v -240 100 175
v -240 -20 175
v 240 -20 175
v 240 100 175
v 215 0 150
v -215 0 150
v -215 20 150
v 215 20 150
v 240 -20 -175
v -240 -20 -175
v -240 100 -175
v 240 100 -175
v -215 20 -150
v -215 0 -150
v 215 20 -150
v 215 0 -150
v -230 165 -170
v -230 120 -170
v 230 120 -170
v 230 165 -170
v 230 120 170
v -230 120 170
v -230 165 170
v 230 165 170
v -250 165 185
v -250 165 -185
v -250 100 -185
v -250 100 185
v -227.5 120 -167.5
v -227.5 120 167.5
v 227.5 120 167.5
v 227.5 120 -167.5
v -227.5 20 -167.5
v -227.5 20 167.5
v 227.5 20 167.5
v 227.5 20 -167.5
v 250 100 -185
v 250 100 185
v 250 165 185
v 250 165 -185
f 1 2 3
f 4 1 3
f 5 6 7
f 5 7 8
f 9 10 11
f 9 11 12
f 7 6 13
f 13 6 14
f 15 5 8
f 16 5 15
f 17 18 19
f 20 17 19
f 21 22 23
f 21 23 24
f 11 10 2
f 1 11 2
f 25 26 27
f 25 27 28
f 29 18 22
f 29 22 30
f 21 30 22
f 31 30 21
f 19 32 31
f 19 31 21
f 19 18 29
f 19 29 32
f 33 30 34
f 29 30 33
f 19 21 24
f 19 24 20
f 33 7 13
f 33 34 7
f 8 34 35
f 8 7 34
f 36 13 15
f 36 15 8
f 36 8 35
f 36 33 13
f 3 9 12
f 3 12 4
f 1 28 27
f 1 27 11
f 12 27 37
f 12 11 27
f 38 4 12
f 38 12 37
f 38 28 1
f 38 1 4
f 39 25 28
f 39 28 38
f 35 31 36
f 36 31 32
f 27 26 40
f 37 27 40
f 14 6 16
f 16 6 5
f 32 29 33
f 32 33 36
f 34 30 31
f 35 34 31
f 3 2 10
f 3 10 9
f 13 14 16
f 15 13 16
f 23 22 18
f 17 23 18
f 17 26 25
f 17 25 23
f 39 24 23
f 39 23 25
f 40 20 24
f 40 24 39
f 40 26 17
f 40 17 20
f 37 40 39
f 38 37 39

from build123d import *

# Parameters (mm, degrees)
SKETCH2_W           = 500
SKETCH2_H           = 370
SKETCH2_W_2         = 430
SKETCH2_H_2         = 300
BOSS_EXTRUDE1_DEPTH = 120
SKETCH4_W           = 500
SKETCH4_H           = 370
SKETCH4_W_2         = 460
SKETCH4_H_2         = 340
BOSS_EXTRUDE2_DEPTH = 45
SKETCH5_W           = 500
SKETCH5_H           = 370
BOSS_EXTRUDE3_DEPTH = 20
SKETCH6_W           = 500
SKETCH6_H           = 370
SKETCH6_W_2         = 480
SKETCH6_H_2         = 350
CUT_EXTRUDE1_DEPTH  = 120
SKETCH8_W           = 455
SKETCH8_H           = 335
CUT_EXTRUDE2_DEPTH  = 100


with BuildPart() as part:
    # Sketch2 → Boss-Extrude1 (new body)
    with BuildSketch(Plane(origin=(0, 0, 0), x_dir=(1, 0, 0), z_dir=(0, 1, 0))):
        Rectangle(SKETCH2_W, SKETCH2_H)
        Rectangle(SKETCH2_W_2, SKETCH2_H_2, mode=Mode.SUBTRACT)
    extrude(amount=BOSS_EXTRUDE1_DEPTH)

    # Sketch4 → Boss-Extrude2 (add)
    with BuildSketch(Plane(origin=(0, 120, 0), x_dir=(1, 0, 0), z_dir=(0, 1, 0))):
        Rectangle(SKETCH4_W, SKETCH4_H)
        Rectangle(SKETCH4_W_2, SKETCH4_H_2, mode=Mode.SUBTRACT)
    extrude(amount=BOSS_EXTRUDE2_DEPTH)

    # Sketch5 → Boss-Extrude3 (add)
    with BuildSketch(Plane.XZ):
        Rectangle(SKETCH5_W, SKETCH5_H)
    extrude(amount=BOSS_EXTRUDE3_DEPTH)

    # Sketch6 → Cut-Extrude1 (cut)
    with BuildSketch(Plane.XZ.offset(20)):
        Rectangle(SKETCH6_W, SKETCH6_H)
        Rectangle(SKETCH6_W_2, SKETCH6_H_2, mode=Mode.SUBTRACT)
    extrude(amount=-CUT_EXTRUDE1_DEPTH, mode=Mode.SUBTRACT)

    # Sketch8 → Cut-Extrude2 (cut)
    with BuildSketch(Plane(origin=(0, 120, 0), x_dir=(1, 0, 0), z_dir=(0, 1, 0))):
        Rectangle(SKETCH8_W, SKETCH8_H)
    extrude(amount=-CUT_EXTRUDE2_DEPTH, mode=Mode.SUBTRACT)


solid = part.part
